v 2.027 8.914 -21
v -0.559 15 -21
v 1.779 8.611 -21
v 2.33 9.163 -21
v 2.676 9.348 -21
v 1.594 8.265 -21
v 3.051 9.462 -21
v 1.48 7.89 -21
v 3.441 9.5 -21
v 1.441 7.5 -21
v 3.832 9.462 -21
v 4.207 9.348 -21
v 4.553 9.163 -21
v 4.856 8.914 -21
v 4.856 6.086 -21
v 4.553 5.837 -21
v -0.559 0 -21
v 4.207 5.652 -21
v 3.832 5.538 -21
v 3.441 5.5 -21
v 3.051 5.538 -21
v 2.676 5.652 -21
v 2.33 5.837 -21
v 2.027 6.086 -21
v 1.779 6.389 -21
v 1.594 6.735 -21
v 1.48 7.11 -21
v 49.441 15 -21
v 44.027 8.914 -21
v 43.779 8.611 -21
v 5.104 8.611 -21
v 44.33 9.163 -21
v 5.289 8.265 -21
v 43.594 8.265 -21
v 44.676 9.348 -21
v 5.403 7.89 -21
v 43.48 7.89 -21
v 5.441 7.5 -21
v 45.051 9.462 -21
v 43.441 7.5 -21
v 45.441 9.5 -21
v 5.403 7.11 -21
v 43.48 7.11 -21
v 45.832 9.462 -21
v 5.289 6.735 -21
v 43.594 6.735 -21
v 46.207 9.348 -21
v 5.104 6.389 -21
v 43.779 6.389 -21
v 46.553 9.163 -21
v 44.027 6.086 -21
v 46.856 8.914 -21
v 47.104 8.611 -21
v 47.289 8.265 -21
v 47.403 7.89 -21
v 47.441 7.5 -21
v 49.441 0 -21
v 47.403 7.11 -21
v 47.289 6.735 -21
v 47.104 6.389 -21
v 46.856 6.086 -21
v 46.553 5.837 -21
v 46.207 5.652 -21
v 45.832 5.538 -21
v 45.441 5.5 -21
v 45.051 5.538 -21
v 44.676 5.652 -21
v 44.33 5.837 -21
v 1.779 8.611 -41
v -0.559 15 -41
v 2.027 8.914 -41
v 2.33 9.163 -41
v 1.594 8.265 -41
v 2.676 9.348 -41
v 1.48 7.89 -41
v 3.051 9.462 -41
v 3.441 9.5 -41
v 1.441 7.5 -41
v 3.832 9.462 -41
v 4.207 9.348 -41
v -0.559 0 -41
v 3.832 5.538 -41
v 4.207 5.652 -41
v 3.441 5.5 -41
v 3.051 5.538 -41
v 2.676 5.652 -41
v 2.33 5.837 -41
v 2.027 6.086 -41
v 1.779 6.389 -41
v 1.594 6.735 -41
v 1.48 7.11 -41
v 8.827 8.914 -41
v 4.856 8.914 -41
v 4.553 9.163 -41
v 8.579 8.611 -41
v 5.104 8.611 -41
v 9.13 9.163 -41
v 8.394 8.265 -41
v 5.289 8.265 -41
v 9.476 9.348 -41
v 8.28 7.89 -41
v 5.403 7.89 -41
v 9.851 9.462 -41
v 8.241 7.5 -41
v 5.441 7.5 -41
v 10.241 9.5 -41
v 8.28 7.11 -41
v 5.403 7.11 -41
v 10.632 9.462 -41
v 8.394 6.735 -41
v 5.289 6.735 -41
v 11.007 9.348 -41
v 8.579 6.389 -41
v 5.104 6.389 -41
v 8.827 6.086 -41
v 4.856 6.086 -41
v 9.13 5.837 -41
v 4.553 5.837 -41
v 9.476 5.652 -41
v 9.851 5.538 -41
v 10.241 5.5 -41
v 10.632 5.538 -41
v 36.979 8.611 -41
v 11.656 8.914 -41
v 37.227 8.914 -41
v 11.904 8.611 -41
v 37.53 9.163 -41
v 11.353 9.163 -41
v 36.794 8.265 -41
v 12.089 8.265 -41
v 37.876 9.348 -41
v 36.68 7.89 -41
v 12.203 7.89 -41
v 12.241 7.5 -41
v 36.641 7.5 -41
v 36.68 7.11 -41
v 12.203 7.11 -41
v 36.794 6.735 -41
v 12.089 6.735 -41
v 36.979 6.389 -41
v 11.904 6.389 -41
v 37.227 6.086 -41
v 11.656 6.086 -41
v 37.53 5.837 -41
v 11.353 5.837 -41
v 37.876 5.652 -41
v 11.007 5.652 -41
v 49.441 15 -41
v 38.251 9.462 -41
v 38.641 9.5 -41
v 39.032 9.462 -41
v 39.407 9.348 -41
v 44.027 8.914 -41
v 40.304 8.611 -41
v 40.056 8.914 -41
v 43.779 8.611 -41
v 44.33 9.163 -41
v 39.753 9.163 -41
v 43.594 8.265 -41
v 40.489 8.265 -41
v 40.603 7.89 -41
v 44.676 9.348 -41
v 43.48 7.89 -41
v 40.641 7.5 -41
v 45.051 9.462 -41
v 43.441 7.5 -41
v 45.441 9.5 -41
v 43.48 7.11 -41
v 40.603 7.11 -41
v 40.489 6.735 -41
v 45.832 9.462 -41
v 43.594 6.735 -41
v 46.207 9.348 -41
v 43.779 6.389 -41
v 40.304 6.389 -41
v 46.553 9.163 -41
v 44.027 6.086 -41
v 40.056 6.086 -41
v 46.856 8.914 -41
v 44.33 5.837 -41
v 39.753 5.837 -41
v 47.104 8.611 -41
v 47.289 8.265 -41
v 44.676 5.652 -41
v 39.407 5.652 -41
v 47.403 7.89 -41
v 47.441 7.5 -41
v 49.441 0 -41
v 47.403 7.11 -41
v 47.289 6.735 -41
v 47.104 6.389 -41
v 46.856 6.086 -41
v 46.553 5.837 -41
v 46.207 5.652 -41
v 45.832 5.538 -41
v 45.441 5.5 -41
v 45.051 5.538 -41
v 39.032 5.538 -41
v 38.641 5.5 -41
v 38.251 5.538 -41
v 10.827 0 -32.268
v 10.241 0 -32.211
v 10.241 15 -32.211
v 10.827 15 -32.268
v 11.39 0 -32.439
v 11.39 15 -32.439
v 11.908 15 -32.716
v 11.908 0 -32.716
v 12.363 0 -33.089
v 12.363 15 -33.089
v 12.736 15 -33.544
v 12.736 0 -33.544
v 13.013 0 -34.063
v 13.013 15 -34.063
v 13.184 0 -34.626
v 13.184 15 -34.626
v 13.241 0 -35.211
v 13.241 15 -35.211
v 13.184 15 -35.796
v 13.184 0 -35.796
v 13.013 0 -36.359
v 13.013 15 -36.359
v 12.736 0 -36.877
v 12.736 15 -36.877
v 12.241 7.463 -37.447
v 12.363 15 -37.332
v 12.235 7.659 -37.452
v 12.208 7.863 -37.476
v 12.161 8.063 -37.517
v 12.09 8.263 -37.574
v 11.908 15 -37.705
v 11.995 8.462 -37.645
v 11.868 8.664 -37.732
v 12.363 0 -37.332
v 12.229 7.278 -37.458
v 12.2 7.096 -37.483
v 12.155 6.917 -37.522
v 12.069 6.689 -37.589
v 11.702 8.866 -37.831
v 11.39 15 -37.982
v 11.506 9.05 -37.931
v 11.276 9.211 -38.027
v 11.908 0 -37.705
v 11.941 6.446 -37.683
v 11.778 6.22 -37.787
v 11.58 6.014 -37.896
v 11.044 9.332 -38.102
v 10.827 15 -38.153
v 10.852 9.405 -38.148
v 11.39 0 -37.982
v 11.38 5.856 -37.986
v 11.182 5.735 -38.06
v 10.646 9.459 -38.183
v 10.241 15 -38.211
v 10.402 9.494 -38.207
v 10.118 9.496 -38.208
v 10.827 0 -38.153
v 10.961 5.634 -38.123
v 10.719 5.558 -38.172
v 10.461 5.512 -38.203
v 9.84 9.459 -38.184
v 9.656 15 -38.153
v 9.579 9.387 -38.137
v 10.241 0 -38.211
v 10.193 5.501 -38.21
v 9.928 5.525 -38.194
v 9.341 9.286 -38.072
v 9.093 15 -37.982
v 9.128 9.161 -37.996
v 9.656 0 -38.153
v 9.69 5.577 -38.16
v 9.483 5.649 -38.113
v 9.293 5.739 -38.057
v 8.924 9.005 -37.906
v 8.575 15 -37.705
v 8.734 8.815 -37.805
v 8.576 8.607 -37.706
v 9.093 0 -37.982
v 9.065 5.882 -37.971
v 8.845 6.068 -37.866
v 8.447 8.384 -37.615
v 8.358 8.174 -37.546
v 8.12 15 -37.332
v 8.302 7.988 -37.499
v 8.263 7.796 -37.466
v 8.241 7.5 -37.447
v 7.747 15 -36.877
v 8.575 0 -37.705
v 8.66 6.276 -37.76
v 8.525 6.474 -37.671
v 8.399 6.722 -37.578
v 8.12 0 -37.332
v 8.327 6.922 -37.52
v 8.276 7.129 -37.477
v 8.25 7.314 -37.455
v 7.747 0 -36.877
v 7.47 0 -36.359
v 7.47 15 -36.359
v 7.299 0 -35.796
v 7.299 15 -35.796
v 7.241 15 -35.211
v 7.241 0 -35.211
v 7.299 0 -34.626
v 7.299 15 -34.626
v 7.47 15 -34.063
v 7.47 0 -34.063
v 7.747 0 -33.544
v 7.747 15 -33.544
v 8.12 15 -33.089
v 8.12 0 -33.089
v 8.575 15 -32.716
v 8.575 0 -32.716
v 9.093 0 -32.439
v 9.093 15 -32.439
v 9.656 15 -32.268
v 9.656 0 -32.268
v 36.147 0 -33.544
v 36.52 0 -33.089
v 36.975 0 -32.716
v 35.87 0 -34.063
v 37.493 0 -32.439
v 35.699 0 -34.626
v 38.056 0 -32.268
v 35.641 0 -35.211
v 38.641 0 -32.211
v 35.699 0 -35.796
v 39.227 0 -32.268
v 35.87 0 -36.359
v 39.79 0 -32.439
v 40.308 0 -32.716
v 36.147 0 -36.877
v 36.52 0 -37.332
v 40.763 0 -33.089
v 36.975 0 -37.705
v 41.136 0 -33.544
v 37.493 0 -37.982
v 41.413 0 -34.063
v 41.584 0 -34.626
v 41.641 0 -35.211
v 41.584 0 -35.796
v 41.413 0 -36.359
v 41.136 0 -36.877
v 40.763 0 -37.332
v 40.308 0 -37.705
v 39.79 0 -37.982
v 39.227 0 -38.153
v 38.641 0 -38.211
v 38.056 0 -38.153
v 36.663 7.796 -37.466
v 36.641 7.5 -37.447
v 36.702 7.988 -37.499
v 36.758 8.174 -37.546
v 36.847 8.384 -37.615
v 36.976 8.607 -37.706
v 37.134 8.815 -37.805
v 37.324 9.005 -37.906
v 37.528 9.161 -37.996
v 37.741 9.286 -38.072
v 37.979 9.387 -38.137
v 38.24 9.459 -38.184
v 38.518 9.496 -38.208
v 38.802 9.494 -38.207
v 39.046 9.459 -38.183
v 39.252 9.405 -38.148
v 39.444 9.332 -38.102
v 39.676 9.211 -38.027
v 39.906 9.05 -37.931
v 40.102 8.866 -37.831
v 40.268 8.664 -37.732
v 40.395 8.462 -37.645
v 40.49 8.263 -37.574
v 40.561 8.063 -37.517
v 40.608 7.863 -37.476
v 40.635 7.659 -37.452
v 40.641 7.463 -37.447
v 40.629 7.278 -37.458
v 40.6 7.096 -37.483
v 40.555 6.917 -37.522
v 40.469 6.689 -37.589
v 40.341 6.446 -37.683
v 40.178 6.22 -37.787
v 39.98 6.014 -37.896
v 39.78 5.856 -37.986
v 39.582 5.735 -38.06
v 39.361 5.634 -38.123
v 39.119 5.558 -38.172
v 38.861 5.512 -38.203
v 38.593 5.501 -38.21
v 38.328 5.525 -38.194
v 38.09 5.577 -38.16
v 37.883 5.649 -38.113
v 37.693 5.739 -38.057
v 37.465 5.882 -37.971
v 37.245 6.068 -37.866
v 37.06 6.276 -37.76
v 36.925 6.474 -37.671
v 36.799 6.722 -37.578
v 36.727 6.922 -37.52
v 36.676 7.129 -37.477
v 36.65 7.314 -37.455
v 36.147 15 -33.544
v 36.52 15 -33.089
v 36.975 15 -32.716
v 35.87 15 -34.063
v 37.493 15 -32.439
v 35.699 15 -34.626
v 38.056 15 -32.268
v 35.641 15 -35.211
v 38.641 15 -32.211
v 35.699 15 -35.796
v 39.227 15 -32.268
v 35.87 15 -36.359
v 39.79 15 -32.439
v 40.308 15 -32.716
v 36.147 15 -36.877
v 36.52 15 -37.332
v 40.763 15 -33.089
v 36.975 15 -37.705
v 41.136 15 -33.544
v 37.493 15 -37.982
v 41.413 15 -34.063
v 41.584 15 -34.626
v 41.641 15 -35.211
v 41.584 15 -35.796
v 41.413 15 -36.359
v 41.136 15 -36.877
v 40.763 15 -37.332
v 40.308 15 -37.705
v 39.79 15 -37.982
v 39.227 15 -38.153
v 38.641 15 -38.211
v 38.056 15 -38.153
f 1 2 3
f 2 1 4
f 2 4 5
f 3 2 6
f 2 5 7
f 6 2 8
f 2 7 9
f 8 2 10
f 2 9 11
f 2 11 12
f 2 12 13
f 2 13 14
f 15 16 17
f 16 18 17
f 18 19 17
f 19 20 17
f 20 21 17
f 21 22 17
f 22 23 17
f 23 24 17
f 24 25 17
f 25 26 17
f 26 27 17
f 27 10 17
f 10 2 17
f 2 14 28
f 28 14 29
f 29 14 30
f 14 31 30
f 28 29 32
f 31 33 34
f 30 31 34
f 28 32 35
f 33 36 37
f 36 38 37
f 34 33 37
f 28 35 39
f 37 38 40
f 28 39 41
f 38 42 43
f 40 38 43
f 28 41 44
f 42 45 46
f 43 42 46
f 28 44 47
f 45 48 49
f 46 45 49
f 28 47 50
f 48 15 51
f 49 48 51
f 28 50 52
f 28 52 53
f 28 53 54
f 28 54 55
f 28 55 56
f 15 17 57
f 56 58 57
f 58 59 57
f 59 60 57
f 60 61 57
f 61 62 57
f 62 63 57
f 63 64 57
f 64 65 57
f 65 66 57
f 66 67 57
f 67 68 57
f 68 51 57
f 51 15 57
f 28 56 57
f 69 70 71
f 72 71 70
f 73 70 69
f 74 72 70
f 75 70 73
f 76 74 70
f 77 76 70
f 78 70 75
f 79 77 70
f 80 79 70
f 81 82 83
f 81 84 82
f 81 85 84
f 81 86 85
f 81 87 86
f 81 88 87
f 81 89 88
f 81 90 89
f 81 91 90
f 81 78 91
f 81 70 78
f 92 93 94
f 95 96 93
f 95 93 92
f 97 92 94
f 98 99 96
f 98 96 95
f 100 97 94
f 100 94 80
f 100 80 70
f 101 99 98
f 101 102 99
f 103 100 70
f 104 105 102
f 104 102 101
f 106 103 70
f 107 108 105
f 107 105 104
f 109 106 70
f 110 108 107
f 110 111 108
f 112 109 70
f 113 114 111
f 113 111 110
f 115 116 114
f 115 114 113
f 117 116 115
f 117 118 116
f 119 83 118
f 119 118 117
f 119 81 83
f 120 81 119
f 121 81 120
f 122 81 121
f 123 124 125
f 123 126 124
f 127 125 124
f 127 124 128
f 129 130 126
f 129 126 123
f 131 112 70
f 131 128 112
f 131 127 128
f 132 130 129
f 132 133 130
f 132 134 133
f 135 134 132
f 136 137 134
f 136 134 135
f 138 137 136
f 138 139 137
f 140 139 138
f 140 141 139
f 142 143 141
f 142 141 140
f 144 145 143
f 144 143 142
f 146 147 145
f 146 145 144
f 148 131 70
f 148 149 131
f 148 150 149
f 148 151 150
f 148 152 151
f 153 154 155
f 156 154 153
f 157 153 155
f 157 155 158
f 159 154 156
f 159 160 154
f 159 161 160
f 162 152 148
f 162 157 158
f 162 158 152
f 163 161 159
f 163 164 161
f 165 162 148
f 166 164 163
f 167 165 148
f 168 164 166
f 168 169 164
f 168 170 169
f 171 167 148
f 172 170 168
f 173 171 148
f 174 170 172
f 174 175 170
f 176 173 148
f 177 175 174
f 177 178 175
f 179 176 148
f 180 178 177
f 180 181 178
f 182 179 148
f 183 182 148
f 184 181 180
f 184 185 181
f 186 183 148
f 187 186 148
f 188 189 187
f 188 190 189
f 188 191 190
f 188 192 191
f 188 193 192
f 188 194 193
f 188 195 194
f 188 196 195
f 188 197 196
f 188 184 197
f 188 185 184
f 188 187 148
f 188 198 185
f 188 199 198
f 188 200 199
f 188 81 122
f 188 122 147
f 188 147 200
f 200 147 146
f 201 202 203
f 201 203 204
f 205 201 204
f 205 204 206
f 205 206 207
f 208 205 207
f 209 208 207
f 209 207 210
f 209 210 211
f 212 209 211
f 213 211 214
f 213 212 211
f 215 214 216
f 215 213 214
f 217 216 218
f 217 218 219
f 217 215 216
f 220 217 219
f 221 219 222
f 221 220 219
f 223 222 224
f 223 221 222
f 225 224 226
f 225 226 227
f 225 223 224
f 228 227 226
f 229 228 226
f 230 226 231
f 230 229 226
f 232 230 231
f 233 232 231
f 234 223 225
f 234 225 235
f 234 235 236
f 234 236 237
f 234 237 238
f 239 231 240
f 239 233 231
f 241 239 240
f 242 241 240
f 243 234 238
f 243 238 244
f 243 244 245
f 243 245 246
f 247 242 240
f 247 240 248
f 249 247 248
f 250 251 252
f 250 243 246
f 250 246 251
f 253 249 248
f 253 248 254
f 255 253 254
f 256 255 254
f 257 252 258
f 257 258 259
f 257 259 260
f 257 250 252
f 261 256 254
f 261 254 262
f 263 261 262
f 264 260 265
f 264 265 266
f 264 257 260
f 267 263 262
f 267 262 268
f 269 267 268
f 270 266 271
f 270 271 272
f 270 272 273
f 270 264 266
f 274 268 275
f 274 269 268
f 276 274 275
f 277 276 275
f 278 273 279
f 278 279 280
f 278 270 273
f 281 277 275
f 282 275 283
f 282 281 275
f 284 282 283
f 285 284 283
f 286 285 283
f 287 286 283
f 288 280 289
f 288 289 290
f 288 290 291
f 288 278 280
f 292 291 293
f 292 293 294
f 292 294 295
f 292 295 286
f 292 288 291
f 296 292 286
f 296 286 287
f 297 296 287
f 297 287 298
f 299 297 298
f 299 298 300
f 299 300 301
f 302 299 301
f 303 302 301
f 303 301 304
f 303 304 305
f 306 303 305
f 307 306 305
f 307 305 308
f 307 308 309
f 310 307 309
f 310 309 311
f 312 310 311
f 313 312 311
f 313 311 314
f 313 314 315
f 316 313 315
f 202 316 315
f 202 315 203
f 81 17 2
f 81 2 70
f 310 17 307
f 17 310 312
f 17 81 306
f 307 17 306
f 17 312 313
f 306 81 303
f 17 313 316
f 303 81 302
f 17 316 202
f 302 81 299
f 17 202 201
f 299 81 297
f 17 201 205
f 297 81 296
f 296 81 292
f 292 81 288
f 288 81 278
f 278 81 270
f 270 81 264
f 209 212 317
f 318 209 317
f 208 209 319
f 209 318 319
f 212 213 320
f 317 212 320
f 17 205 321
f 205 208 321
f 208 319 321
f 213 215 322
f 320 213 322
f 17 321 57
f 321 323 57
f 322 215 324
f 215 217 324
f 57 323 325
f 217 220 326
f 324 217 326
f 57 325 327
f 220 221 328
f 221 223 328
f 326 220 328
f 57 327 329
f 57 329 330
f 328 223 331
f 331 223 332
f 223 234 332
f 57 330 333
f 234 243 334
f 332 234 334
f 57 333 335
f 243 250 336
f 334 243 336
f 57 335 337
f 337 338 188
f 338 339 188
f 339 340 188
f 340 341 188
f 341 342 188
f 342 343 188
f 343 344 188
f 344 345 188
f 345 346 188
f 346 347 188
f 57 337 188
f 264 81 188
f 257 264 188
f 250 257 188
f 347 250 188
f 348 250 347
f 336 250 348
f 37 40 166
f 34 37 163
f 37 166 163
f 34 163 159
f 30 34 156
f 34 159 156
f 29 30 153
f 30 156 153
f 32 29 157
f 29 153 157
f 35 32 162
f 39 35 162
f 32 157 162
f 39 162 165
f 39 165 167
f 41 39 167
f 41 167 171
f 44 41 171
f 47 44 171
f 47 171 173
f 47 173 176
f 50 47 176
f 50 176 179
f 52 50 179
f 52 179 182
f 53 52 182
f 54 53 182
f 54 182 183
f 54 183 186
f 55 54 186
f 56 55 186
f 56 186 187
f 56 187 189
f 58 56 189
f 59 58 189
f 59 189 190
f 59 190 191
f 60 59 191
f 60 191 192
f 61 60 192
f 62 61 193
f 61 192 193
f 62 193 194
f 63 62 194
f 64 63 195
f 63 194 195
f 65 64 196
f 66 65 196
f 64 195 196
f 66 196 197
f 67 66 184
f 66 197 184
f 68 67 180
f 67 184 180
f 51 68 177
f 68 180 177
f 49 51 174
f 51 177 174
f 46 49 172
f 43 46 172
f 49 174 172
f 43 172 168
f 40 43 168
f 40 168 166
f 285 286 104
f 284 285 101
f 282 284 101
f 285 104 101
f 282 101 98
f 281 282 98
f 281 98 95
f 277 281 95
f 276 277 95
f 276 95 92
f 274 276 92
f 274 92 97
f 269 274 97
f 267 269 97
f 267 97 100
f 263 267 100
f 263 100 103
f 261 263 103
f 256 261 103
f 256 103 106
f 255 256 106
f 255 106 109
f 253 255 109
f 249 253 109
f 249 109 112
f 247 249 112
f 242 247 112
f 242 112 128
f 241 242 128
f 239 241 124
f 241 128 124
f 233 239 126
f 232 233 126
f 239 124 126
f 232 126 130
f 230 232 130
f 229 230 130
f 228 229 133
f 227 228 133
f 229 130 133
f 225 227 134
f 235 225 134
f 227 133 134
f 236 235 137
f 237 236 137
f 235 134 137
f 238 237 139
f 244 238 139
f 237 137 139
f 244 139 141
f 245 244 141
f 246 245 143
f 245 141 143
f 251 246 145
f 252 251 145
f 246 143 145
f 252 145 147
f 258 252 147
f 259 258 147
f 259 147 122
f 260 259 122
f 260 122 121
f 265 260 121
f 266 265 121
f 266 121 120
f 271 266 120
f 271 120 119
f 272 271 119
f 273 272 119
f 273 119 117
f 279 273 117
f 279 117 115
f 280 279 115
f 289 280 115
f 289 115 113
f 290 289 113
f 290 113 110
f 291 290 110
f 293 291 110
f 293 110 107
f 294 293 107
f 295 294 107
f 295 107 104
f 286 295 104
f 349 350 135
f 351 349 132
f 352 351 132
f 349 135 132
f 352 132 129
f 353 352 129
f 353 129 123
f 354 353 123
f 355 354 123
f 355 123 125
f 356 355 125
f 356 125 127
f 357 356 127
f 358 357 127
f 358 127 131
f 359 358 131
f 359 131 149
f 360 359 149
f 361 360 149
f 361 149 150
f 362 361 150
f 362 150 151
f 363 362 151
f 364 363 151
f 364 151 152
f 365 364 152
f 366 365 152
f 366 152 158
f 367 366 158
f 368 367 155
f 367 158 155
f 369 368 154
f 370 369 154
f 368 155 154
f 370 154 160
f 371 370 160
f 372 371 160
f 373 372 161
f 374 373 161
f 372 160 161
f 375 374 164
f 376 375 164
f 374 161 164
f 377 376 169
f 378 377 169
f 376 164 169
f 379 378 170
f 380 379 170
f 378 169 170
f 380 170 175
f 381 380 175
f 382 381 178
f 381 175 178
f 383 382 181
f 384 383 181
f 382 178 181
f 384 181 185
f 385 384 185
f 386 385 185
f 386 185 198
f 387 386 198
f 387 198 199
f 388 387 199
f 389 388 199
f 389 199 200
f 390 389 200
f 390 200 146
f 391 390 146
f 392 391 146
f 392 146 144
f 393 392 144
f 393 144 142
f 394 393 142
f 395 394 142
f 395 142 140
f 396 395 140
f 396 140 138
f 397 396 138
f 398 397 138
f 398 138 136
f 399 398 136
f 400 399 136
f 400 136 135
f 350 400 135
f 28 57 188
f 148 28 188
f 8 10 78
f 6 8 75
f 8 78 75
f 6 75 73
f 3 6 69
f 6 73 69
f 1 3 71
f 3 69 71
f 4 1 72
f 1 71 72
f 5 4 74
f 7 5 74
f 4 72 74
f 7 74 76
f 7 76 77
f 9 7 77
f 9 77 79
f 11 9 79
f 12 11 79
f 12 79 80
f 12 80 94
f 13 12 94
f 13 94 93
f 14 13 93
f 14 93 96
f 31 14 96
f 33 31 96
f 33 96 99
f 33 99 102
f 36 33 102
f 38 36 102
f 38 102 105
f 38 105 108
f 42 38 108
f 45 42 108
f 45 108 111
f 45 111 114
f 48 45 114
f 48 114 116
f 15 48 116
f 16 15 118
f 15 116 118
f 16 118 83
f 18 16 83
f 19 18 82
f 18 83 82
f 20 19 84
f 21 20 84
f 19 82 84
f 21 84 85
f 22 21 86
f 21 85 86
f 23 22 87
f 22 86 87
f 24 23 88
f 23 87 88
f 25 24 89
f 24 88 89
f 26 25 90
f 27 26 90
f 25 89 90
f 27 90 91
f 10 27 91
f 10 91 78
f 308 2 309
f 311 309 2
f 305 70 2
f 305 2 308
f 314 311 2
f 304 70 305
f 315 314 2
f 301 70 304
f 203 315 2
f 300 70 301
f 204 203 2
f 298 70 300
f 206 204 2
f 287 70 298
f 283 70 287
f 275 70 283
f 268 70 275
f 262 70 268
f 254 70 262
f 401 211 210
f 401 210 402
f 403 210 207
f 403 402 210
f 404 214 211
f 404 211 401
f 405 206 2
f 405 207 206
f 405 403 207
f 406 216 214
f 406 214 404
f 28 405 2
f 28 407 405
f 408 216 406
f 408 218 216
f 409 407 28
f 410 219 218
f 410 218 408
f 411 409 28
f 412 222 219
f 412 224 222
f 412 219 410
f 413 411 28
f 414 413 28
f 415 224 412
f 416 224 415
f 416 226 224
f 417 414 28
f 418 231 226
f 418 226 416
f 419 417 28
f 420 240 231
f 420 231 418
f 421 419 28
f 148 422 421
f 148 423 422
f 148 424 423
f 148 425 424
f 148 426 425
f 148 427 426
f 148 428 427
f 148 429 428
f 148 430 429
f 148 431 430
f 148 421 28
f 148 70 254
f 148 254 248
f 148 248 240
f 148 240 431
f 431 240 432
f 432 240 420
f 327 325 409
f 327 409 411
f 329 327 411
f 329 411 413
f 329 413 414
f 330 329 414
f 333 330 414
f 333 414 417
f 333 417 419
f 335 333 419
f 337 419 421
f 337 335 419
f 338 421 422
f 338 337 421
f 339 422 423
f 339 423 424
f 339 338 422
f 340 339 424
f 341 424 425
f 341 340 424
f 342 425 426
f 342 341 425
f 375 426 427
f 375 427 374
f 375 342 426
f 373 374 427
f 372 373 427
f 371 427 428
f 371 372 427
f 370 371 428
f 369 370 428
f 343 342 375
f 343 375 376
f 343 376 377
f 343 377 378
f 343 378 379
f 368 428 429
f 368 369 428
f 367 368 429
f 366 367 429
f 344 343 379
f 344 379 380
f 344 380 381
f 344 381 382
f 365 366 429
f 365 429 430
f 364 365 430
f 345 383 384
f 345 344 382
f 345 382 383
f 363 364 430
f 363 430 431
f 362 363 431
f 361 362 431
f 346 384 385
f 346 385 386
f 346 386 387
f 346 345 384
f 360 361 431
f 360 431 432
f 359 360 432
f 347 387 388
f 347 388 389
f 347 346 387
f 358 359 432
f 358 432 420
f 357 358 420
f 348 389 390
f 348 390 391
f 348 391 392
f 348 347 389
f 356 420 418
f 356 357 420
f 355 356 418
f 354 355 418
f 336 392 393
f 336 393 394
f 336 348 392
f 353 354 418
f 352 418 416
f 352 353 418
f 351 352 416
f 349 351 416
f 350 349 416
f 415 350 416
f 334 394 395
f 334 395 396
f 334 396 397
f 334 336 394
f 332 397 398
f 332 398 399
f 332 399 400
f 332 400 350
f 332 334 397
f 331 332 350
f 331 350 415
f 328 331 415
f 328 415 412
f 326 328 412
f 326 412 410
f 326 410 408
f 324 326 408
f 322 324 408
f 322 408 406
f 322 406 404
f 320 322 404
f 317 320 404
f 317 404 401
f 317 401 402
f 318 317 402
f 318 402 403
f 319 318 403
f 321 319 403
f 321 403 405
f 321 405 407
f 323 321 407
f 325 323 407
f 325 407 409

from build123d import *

# Parameters (mm, degrees)
ESBO_O1_W                = 50
ESBO_O1_H                = 20
ESBO_O1_R                = 3
RESSALTO_EXTRUS_O1_DEPTH = 15
ESBO_O2_R                = 2
CORTE_EXTRUS_O1_DEPTH    = 56.402686144
ESBO_O3_R                = 2
CORTE_EXTRUS_O2_DEPTH    = 4


with BuildPart() as part:
    # Esboço1 → Ressalto-extrusão1 (new body)
    with BuildSketch(Plane(origin=(0, 0, 0), x_dir=(1, 0, 0), z_dir=(0, 1, 0))):
        with Locations((24.441456613, 31)):
            Rectangle(ESBO_O1_W, ESBO_O1_H)
        with Locations(Location((10.241456613, 35.210777548, 0), (0, 0, 270))):
            Circle(ESBO_O1_R, mode=Mode.SUBTRACT)
        with Locations(Location((38.641456613, 35.210777548, 0), (0, 0, 270))):
            Circle(ESBO_O1_R, mode=Mode.SUBTRACT)
    extrude(amount=RESSALTO_EXTRUS_O1_DEPTH)

    # Esboço2 → Corte-extrusão1 (cut, through all)
    with BuildSketch(Plane(origin=(0, 0, -41), x_dir=(-1, 0, 0), z_dir=(0, 0, -1))):
        with Locations((-3.441456613, 7.5)):
            Circle(ESBO_O2_R)
        with Locations((-45.441456613, 7.5)):
            Circle(ESBO_O2_R)
    extrude(amount=-CORTE_EXTRUS_O1_DEPTH, mode=Mode.SUBTRACT)

    # Esboço3 → Corte-extrusão2 (cut)
    with BuildSketch(Plane(origin=(0, 0, -41), x_dir=(-1, 0, 0), z_dir=(0, 0, -1))):
        with Locations((-10.241456613, 7.5)):
            Circle(ESBO_O3_R)
        with Locations((-38.641456613, 7.5)):
            Circle(ESBO_O3_R)
    extrude(amount=-CORTE_EXTRUS_O2_DEPTH, mode=Mode.SUBTRACT)


solid = part.part
